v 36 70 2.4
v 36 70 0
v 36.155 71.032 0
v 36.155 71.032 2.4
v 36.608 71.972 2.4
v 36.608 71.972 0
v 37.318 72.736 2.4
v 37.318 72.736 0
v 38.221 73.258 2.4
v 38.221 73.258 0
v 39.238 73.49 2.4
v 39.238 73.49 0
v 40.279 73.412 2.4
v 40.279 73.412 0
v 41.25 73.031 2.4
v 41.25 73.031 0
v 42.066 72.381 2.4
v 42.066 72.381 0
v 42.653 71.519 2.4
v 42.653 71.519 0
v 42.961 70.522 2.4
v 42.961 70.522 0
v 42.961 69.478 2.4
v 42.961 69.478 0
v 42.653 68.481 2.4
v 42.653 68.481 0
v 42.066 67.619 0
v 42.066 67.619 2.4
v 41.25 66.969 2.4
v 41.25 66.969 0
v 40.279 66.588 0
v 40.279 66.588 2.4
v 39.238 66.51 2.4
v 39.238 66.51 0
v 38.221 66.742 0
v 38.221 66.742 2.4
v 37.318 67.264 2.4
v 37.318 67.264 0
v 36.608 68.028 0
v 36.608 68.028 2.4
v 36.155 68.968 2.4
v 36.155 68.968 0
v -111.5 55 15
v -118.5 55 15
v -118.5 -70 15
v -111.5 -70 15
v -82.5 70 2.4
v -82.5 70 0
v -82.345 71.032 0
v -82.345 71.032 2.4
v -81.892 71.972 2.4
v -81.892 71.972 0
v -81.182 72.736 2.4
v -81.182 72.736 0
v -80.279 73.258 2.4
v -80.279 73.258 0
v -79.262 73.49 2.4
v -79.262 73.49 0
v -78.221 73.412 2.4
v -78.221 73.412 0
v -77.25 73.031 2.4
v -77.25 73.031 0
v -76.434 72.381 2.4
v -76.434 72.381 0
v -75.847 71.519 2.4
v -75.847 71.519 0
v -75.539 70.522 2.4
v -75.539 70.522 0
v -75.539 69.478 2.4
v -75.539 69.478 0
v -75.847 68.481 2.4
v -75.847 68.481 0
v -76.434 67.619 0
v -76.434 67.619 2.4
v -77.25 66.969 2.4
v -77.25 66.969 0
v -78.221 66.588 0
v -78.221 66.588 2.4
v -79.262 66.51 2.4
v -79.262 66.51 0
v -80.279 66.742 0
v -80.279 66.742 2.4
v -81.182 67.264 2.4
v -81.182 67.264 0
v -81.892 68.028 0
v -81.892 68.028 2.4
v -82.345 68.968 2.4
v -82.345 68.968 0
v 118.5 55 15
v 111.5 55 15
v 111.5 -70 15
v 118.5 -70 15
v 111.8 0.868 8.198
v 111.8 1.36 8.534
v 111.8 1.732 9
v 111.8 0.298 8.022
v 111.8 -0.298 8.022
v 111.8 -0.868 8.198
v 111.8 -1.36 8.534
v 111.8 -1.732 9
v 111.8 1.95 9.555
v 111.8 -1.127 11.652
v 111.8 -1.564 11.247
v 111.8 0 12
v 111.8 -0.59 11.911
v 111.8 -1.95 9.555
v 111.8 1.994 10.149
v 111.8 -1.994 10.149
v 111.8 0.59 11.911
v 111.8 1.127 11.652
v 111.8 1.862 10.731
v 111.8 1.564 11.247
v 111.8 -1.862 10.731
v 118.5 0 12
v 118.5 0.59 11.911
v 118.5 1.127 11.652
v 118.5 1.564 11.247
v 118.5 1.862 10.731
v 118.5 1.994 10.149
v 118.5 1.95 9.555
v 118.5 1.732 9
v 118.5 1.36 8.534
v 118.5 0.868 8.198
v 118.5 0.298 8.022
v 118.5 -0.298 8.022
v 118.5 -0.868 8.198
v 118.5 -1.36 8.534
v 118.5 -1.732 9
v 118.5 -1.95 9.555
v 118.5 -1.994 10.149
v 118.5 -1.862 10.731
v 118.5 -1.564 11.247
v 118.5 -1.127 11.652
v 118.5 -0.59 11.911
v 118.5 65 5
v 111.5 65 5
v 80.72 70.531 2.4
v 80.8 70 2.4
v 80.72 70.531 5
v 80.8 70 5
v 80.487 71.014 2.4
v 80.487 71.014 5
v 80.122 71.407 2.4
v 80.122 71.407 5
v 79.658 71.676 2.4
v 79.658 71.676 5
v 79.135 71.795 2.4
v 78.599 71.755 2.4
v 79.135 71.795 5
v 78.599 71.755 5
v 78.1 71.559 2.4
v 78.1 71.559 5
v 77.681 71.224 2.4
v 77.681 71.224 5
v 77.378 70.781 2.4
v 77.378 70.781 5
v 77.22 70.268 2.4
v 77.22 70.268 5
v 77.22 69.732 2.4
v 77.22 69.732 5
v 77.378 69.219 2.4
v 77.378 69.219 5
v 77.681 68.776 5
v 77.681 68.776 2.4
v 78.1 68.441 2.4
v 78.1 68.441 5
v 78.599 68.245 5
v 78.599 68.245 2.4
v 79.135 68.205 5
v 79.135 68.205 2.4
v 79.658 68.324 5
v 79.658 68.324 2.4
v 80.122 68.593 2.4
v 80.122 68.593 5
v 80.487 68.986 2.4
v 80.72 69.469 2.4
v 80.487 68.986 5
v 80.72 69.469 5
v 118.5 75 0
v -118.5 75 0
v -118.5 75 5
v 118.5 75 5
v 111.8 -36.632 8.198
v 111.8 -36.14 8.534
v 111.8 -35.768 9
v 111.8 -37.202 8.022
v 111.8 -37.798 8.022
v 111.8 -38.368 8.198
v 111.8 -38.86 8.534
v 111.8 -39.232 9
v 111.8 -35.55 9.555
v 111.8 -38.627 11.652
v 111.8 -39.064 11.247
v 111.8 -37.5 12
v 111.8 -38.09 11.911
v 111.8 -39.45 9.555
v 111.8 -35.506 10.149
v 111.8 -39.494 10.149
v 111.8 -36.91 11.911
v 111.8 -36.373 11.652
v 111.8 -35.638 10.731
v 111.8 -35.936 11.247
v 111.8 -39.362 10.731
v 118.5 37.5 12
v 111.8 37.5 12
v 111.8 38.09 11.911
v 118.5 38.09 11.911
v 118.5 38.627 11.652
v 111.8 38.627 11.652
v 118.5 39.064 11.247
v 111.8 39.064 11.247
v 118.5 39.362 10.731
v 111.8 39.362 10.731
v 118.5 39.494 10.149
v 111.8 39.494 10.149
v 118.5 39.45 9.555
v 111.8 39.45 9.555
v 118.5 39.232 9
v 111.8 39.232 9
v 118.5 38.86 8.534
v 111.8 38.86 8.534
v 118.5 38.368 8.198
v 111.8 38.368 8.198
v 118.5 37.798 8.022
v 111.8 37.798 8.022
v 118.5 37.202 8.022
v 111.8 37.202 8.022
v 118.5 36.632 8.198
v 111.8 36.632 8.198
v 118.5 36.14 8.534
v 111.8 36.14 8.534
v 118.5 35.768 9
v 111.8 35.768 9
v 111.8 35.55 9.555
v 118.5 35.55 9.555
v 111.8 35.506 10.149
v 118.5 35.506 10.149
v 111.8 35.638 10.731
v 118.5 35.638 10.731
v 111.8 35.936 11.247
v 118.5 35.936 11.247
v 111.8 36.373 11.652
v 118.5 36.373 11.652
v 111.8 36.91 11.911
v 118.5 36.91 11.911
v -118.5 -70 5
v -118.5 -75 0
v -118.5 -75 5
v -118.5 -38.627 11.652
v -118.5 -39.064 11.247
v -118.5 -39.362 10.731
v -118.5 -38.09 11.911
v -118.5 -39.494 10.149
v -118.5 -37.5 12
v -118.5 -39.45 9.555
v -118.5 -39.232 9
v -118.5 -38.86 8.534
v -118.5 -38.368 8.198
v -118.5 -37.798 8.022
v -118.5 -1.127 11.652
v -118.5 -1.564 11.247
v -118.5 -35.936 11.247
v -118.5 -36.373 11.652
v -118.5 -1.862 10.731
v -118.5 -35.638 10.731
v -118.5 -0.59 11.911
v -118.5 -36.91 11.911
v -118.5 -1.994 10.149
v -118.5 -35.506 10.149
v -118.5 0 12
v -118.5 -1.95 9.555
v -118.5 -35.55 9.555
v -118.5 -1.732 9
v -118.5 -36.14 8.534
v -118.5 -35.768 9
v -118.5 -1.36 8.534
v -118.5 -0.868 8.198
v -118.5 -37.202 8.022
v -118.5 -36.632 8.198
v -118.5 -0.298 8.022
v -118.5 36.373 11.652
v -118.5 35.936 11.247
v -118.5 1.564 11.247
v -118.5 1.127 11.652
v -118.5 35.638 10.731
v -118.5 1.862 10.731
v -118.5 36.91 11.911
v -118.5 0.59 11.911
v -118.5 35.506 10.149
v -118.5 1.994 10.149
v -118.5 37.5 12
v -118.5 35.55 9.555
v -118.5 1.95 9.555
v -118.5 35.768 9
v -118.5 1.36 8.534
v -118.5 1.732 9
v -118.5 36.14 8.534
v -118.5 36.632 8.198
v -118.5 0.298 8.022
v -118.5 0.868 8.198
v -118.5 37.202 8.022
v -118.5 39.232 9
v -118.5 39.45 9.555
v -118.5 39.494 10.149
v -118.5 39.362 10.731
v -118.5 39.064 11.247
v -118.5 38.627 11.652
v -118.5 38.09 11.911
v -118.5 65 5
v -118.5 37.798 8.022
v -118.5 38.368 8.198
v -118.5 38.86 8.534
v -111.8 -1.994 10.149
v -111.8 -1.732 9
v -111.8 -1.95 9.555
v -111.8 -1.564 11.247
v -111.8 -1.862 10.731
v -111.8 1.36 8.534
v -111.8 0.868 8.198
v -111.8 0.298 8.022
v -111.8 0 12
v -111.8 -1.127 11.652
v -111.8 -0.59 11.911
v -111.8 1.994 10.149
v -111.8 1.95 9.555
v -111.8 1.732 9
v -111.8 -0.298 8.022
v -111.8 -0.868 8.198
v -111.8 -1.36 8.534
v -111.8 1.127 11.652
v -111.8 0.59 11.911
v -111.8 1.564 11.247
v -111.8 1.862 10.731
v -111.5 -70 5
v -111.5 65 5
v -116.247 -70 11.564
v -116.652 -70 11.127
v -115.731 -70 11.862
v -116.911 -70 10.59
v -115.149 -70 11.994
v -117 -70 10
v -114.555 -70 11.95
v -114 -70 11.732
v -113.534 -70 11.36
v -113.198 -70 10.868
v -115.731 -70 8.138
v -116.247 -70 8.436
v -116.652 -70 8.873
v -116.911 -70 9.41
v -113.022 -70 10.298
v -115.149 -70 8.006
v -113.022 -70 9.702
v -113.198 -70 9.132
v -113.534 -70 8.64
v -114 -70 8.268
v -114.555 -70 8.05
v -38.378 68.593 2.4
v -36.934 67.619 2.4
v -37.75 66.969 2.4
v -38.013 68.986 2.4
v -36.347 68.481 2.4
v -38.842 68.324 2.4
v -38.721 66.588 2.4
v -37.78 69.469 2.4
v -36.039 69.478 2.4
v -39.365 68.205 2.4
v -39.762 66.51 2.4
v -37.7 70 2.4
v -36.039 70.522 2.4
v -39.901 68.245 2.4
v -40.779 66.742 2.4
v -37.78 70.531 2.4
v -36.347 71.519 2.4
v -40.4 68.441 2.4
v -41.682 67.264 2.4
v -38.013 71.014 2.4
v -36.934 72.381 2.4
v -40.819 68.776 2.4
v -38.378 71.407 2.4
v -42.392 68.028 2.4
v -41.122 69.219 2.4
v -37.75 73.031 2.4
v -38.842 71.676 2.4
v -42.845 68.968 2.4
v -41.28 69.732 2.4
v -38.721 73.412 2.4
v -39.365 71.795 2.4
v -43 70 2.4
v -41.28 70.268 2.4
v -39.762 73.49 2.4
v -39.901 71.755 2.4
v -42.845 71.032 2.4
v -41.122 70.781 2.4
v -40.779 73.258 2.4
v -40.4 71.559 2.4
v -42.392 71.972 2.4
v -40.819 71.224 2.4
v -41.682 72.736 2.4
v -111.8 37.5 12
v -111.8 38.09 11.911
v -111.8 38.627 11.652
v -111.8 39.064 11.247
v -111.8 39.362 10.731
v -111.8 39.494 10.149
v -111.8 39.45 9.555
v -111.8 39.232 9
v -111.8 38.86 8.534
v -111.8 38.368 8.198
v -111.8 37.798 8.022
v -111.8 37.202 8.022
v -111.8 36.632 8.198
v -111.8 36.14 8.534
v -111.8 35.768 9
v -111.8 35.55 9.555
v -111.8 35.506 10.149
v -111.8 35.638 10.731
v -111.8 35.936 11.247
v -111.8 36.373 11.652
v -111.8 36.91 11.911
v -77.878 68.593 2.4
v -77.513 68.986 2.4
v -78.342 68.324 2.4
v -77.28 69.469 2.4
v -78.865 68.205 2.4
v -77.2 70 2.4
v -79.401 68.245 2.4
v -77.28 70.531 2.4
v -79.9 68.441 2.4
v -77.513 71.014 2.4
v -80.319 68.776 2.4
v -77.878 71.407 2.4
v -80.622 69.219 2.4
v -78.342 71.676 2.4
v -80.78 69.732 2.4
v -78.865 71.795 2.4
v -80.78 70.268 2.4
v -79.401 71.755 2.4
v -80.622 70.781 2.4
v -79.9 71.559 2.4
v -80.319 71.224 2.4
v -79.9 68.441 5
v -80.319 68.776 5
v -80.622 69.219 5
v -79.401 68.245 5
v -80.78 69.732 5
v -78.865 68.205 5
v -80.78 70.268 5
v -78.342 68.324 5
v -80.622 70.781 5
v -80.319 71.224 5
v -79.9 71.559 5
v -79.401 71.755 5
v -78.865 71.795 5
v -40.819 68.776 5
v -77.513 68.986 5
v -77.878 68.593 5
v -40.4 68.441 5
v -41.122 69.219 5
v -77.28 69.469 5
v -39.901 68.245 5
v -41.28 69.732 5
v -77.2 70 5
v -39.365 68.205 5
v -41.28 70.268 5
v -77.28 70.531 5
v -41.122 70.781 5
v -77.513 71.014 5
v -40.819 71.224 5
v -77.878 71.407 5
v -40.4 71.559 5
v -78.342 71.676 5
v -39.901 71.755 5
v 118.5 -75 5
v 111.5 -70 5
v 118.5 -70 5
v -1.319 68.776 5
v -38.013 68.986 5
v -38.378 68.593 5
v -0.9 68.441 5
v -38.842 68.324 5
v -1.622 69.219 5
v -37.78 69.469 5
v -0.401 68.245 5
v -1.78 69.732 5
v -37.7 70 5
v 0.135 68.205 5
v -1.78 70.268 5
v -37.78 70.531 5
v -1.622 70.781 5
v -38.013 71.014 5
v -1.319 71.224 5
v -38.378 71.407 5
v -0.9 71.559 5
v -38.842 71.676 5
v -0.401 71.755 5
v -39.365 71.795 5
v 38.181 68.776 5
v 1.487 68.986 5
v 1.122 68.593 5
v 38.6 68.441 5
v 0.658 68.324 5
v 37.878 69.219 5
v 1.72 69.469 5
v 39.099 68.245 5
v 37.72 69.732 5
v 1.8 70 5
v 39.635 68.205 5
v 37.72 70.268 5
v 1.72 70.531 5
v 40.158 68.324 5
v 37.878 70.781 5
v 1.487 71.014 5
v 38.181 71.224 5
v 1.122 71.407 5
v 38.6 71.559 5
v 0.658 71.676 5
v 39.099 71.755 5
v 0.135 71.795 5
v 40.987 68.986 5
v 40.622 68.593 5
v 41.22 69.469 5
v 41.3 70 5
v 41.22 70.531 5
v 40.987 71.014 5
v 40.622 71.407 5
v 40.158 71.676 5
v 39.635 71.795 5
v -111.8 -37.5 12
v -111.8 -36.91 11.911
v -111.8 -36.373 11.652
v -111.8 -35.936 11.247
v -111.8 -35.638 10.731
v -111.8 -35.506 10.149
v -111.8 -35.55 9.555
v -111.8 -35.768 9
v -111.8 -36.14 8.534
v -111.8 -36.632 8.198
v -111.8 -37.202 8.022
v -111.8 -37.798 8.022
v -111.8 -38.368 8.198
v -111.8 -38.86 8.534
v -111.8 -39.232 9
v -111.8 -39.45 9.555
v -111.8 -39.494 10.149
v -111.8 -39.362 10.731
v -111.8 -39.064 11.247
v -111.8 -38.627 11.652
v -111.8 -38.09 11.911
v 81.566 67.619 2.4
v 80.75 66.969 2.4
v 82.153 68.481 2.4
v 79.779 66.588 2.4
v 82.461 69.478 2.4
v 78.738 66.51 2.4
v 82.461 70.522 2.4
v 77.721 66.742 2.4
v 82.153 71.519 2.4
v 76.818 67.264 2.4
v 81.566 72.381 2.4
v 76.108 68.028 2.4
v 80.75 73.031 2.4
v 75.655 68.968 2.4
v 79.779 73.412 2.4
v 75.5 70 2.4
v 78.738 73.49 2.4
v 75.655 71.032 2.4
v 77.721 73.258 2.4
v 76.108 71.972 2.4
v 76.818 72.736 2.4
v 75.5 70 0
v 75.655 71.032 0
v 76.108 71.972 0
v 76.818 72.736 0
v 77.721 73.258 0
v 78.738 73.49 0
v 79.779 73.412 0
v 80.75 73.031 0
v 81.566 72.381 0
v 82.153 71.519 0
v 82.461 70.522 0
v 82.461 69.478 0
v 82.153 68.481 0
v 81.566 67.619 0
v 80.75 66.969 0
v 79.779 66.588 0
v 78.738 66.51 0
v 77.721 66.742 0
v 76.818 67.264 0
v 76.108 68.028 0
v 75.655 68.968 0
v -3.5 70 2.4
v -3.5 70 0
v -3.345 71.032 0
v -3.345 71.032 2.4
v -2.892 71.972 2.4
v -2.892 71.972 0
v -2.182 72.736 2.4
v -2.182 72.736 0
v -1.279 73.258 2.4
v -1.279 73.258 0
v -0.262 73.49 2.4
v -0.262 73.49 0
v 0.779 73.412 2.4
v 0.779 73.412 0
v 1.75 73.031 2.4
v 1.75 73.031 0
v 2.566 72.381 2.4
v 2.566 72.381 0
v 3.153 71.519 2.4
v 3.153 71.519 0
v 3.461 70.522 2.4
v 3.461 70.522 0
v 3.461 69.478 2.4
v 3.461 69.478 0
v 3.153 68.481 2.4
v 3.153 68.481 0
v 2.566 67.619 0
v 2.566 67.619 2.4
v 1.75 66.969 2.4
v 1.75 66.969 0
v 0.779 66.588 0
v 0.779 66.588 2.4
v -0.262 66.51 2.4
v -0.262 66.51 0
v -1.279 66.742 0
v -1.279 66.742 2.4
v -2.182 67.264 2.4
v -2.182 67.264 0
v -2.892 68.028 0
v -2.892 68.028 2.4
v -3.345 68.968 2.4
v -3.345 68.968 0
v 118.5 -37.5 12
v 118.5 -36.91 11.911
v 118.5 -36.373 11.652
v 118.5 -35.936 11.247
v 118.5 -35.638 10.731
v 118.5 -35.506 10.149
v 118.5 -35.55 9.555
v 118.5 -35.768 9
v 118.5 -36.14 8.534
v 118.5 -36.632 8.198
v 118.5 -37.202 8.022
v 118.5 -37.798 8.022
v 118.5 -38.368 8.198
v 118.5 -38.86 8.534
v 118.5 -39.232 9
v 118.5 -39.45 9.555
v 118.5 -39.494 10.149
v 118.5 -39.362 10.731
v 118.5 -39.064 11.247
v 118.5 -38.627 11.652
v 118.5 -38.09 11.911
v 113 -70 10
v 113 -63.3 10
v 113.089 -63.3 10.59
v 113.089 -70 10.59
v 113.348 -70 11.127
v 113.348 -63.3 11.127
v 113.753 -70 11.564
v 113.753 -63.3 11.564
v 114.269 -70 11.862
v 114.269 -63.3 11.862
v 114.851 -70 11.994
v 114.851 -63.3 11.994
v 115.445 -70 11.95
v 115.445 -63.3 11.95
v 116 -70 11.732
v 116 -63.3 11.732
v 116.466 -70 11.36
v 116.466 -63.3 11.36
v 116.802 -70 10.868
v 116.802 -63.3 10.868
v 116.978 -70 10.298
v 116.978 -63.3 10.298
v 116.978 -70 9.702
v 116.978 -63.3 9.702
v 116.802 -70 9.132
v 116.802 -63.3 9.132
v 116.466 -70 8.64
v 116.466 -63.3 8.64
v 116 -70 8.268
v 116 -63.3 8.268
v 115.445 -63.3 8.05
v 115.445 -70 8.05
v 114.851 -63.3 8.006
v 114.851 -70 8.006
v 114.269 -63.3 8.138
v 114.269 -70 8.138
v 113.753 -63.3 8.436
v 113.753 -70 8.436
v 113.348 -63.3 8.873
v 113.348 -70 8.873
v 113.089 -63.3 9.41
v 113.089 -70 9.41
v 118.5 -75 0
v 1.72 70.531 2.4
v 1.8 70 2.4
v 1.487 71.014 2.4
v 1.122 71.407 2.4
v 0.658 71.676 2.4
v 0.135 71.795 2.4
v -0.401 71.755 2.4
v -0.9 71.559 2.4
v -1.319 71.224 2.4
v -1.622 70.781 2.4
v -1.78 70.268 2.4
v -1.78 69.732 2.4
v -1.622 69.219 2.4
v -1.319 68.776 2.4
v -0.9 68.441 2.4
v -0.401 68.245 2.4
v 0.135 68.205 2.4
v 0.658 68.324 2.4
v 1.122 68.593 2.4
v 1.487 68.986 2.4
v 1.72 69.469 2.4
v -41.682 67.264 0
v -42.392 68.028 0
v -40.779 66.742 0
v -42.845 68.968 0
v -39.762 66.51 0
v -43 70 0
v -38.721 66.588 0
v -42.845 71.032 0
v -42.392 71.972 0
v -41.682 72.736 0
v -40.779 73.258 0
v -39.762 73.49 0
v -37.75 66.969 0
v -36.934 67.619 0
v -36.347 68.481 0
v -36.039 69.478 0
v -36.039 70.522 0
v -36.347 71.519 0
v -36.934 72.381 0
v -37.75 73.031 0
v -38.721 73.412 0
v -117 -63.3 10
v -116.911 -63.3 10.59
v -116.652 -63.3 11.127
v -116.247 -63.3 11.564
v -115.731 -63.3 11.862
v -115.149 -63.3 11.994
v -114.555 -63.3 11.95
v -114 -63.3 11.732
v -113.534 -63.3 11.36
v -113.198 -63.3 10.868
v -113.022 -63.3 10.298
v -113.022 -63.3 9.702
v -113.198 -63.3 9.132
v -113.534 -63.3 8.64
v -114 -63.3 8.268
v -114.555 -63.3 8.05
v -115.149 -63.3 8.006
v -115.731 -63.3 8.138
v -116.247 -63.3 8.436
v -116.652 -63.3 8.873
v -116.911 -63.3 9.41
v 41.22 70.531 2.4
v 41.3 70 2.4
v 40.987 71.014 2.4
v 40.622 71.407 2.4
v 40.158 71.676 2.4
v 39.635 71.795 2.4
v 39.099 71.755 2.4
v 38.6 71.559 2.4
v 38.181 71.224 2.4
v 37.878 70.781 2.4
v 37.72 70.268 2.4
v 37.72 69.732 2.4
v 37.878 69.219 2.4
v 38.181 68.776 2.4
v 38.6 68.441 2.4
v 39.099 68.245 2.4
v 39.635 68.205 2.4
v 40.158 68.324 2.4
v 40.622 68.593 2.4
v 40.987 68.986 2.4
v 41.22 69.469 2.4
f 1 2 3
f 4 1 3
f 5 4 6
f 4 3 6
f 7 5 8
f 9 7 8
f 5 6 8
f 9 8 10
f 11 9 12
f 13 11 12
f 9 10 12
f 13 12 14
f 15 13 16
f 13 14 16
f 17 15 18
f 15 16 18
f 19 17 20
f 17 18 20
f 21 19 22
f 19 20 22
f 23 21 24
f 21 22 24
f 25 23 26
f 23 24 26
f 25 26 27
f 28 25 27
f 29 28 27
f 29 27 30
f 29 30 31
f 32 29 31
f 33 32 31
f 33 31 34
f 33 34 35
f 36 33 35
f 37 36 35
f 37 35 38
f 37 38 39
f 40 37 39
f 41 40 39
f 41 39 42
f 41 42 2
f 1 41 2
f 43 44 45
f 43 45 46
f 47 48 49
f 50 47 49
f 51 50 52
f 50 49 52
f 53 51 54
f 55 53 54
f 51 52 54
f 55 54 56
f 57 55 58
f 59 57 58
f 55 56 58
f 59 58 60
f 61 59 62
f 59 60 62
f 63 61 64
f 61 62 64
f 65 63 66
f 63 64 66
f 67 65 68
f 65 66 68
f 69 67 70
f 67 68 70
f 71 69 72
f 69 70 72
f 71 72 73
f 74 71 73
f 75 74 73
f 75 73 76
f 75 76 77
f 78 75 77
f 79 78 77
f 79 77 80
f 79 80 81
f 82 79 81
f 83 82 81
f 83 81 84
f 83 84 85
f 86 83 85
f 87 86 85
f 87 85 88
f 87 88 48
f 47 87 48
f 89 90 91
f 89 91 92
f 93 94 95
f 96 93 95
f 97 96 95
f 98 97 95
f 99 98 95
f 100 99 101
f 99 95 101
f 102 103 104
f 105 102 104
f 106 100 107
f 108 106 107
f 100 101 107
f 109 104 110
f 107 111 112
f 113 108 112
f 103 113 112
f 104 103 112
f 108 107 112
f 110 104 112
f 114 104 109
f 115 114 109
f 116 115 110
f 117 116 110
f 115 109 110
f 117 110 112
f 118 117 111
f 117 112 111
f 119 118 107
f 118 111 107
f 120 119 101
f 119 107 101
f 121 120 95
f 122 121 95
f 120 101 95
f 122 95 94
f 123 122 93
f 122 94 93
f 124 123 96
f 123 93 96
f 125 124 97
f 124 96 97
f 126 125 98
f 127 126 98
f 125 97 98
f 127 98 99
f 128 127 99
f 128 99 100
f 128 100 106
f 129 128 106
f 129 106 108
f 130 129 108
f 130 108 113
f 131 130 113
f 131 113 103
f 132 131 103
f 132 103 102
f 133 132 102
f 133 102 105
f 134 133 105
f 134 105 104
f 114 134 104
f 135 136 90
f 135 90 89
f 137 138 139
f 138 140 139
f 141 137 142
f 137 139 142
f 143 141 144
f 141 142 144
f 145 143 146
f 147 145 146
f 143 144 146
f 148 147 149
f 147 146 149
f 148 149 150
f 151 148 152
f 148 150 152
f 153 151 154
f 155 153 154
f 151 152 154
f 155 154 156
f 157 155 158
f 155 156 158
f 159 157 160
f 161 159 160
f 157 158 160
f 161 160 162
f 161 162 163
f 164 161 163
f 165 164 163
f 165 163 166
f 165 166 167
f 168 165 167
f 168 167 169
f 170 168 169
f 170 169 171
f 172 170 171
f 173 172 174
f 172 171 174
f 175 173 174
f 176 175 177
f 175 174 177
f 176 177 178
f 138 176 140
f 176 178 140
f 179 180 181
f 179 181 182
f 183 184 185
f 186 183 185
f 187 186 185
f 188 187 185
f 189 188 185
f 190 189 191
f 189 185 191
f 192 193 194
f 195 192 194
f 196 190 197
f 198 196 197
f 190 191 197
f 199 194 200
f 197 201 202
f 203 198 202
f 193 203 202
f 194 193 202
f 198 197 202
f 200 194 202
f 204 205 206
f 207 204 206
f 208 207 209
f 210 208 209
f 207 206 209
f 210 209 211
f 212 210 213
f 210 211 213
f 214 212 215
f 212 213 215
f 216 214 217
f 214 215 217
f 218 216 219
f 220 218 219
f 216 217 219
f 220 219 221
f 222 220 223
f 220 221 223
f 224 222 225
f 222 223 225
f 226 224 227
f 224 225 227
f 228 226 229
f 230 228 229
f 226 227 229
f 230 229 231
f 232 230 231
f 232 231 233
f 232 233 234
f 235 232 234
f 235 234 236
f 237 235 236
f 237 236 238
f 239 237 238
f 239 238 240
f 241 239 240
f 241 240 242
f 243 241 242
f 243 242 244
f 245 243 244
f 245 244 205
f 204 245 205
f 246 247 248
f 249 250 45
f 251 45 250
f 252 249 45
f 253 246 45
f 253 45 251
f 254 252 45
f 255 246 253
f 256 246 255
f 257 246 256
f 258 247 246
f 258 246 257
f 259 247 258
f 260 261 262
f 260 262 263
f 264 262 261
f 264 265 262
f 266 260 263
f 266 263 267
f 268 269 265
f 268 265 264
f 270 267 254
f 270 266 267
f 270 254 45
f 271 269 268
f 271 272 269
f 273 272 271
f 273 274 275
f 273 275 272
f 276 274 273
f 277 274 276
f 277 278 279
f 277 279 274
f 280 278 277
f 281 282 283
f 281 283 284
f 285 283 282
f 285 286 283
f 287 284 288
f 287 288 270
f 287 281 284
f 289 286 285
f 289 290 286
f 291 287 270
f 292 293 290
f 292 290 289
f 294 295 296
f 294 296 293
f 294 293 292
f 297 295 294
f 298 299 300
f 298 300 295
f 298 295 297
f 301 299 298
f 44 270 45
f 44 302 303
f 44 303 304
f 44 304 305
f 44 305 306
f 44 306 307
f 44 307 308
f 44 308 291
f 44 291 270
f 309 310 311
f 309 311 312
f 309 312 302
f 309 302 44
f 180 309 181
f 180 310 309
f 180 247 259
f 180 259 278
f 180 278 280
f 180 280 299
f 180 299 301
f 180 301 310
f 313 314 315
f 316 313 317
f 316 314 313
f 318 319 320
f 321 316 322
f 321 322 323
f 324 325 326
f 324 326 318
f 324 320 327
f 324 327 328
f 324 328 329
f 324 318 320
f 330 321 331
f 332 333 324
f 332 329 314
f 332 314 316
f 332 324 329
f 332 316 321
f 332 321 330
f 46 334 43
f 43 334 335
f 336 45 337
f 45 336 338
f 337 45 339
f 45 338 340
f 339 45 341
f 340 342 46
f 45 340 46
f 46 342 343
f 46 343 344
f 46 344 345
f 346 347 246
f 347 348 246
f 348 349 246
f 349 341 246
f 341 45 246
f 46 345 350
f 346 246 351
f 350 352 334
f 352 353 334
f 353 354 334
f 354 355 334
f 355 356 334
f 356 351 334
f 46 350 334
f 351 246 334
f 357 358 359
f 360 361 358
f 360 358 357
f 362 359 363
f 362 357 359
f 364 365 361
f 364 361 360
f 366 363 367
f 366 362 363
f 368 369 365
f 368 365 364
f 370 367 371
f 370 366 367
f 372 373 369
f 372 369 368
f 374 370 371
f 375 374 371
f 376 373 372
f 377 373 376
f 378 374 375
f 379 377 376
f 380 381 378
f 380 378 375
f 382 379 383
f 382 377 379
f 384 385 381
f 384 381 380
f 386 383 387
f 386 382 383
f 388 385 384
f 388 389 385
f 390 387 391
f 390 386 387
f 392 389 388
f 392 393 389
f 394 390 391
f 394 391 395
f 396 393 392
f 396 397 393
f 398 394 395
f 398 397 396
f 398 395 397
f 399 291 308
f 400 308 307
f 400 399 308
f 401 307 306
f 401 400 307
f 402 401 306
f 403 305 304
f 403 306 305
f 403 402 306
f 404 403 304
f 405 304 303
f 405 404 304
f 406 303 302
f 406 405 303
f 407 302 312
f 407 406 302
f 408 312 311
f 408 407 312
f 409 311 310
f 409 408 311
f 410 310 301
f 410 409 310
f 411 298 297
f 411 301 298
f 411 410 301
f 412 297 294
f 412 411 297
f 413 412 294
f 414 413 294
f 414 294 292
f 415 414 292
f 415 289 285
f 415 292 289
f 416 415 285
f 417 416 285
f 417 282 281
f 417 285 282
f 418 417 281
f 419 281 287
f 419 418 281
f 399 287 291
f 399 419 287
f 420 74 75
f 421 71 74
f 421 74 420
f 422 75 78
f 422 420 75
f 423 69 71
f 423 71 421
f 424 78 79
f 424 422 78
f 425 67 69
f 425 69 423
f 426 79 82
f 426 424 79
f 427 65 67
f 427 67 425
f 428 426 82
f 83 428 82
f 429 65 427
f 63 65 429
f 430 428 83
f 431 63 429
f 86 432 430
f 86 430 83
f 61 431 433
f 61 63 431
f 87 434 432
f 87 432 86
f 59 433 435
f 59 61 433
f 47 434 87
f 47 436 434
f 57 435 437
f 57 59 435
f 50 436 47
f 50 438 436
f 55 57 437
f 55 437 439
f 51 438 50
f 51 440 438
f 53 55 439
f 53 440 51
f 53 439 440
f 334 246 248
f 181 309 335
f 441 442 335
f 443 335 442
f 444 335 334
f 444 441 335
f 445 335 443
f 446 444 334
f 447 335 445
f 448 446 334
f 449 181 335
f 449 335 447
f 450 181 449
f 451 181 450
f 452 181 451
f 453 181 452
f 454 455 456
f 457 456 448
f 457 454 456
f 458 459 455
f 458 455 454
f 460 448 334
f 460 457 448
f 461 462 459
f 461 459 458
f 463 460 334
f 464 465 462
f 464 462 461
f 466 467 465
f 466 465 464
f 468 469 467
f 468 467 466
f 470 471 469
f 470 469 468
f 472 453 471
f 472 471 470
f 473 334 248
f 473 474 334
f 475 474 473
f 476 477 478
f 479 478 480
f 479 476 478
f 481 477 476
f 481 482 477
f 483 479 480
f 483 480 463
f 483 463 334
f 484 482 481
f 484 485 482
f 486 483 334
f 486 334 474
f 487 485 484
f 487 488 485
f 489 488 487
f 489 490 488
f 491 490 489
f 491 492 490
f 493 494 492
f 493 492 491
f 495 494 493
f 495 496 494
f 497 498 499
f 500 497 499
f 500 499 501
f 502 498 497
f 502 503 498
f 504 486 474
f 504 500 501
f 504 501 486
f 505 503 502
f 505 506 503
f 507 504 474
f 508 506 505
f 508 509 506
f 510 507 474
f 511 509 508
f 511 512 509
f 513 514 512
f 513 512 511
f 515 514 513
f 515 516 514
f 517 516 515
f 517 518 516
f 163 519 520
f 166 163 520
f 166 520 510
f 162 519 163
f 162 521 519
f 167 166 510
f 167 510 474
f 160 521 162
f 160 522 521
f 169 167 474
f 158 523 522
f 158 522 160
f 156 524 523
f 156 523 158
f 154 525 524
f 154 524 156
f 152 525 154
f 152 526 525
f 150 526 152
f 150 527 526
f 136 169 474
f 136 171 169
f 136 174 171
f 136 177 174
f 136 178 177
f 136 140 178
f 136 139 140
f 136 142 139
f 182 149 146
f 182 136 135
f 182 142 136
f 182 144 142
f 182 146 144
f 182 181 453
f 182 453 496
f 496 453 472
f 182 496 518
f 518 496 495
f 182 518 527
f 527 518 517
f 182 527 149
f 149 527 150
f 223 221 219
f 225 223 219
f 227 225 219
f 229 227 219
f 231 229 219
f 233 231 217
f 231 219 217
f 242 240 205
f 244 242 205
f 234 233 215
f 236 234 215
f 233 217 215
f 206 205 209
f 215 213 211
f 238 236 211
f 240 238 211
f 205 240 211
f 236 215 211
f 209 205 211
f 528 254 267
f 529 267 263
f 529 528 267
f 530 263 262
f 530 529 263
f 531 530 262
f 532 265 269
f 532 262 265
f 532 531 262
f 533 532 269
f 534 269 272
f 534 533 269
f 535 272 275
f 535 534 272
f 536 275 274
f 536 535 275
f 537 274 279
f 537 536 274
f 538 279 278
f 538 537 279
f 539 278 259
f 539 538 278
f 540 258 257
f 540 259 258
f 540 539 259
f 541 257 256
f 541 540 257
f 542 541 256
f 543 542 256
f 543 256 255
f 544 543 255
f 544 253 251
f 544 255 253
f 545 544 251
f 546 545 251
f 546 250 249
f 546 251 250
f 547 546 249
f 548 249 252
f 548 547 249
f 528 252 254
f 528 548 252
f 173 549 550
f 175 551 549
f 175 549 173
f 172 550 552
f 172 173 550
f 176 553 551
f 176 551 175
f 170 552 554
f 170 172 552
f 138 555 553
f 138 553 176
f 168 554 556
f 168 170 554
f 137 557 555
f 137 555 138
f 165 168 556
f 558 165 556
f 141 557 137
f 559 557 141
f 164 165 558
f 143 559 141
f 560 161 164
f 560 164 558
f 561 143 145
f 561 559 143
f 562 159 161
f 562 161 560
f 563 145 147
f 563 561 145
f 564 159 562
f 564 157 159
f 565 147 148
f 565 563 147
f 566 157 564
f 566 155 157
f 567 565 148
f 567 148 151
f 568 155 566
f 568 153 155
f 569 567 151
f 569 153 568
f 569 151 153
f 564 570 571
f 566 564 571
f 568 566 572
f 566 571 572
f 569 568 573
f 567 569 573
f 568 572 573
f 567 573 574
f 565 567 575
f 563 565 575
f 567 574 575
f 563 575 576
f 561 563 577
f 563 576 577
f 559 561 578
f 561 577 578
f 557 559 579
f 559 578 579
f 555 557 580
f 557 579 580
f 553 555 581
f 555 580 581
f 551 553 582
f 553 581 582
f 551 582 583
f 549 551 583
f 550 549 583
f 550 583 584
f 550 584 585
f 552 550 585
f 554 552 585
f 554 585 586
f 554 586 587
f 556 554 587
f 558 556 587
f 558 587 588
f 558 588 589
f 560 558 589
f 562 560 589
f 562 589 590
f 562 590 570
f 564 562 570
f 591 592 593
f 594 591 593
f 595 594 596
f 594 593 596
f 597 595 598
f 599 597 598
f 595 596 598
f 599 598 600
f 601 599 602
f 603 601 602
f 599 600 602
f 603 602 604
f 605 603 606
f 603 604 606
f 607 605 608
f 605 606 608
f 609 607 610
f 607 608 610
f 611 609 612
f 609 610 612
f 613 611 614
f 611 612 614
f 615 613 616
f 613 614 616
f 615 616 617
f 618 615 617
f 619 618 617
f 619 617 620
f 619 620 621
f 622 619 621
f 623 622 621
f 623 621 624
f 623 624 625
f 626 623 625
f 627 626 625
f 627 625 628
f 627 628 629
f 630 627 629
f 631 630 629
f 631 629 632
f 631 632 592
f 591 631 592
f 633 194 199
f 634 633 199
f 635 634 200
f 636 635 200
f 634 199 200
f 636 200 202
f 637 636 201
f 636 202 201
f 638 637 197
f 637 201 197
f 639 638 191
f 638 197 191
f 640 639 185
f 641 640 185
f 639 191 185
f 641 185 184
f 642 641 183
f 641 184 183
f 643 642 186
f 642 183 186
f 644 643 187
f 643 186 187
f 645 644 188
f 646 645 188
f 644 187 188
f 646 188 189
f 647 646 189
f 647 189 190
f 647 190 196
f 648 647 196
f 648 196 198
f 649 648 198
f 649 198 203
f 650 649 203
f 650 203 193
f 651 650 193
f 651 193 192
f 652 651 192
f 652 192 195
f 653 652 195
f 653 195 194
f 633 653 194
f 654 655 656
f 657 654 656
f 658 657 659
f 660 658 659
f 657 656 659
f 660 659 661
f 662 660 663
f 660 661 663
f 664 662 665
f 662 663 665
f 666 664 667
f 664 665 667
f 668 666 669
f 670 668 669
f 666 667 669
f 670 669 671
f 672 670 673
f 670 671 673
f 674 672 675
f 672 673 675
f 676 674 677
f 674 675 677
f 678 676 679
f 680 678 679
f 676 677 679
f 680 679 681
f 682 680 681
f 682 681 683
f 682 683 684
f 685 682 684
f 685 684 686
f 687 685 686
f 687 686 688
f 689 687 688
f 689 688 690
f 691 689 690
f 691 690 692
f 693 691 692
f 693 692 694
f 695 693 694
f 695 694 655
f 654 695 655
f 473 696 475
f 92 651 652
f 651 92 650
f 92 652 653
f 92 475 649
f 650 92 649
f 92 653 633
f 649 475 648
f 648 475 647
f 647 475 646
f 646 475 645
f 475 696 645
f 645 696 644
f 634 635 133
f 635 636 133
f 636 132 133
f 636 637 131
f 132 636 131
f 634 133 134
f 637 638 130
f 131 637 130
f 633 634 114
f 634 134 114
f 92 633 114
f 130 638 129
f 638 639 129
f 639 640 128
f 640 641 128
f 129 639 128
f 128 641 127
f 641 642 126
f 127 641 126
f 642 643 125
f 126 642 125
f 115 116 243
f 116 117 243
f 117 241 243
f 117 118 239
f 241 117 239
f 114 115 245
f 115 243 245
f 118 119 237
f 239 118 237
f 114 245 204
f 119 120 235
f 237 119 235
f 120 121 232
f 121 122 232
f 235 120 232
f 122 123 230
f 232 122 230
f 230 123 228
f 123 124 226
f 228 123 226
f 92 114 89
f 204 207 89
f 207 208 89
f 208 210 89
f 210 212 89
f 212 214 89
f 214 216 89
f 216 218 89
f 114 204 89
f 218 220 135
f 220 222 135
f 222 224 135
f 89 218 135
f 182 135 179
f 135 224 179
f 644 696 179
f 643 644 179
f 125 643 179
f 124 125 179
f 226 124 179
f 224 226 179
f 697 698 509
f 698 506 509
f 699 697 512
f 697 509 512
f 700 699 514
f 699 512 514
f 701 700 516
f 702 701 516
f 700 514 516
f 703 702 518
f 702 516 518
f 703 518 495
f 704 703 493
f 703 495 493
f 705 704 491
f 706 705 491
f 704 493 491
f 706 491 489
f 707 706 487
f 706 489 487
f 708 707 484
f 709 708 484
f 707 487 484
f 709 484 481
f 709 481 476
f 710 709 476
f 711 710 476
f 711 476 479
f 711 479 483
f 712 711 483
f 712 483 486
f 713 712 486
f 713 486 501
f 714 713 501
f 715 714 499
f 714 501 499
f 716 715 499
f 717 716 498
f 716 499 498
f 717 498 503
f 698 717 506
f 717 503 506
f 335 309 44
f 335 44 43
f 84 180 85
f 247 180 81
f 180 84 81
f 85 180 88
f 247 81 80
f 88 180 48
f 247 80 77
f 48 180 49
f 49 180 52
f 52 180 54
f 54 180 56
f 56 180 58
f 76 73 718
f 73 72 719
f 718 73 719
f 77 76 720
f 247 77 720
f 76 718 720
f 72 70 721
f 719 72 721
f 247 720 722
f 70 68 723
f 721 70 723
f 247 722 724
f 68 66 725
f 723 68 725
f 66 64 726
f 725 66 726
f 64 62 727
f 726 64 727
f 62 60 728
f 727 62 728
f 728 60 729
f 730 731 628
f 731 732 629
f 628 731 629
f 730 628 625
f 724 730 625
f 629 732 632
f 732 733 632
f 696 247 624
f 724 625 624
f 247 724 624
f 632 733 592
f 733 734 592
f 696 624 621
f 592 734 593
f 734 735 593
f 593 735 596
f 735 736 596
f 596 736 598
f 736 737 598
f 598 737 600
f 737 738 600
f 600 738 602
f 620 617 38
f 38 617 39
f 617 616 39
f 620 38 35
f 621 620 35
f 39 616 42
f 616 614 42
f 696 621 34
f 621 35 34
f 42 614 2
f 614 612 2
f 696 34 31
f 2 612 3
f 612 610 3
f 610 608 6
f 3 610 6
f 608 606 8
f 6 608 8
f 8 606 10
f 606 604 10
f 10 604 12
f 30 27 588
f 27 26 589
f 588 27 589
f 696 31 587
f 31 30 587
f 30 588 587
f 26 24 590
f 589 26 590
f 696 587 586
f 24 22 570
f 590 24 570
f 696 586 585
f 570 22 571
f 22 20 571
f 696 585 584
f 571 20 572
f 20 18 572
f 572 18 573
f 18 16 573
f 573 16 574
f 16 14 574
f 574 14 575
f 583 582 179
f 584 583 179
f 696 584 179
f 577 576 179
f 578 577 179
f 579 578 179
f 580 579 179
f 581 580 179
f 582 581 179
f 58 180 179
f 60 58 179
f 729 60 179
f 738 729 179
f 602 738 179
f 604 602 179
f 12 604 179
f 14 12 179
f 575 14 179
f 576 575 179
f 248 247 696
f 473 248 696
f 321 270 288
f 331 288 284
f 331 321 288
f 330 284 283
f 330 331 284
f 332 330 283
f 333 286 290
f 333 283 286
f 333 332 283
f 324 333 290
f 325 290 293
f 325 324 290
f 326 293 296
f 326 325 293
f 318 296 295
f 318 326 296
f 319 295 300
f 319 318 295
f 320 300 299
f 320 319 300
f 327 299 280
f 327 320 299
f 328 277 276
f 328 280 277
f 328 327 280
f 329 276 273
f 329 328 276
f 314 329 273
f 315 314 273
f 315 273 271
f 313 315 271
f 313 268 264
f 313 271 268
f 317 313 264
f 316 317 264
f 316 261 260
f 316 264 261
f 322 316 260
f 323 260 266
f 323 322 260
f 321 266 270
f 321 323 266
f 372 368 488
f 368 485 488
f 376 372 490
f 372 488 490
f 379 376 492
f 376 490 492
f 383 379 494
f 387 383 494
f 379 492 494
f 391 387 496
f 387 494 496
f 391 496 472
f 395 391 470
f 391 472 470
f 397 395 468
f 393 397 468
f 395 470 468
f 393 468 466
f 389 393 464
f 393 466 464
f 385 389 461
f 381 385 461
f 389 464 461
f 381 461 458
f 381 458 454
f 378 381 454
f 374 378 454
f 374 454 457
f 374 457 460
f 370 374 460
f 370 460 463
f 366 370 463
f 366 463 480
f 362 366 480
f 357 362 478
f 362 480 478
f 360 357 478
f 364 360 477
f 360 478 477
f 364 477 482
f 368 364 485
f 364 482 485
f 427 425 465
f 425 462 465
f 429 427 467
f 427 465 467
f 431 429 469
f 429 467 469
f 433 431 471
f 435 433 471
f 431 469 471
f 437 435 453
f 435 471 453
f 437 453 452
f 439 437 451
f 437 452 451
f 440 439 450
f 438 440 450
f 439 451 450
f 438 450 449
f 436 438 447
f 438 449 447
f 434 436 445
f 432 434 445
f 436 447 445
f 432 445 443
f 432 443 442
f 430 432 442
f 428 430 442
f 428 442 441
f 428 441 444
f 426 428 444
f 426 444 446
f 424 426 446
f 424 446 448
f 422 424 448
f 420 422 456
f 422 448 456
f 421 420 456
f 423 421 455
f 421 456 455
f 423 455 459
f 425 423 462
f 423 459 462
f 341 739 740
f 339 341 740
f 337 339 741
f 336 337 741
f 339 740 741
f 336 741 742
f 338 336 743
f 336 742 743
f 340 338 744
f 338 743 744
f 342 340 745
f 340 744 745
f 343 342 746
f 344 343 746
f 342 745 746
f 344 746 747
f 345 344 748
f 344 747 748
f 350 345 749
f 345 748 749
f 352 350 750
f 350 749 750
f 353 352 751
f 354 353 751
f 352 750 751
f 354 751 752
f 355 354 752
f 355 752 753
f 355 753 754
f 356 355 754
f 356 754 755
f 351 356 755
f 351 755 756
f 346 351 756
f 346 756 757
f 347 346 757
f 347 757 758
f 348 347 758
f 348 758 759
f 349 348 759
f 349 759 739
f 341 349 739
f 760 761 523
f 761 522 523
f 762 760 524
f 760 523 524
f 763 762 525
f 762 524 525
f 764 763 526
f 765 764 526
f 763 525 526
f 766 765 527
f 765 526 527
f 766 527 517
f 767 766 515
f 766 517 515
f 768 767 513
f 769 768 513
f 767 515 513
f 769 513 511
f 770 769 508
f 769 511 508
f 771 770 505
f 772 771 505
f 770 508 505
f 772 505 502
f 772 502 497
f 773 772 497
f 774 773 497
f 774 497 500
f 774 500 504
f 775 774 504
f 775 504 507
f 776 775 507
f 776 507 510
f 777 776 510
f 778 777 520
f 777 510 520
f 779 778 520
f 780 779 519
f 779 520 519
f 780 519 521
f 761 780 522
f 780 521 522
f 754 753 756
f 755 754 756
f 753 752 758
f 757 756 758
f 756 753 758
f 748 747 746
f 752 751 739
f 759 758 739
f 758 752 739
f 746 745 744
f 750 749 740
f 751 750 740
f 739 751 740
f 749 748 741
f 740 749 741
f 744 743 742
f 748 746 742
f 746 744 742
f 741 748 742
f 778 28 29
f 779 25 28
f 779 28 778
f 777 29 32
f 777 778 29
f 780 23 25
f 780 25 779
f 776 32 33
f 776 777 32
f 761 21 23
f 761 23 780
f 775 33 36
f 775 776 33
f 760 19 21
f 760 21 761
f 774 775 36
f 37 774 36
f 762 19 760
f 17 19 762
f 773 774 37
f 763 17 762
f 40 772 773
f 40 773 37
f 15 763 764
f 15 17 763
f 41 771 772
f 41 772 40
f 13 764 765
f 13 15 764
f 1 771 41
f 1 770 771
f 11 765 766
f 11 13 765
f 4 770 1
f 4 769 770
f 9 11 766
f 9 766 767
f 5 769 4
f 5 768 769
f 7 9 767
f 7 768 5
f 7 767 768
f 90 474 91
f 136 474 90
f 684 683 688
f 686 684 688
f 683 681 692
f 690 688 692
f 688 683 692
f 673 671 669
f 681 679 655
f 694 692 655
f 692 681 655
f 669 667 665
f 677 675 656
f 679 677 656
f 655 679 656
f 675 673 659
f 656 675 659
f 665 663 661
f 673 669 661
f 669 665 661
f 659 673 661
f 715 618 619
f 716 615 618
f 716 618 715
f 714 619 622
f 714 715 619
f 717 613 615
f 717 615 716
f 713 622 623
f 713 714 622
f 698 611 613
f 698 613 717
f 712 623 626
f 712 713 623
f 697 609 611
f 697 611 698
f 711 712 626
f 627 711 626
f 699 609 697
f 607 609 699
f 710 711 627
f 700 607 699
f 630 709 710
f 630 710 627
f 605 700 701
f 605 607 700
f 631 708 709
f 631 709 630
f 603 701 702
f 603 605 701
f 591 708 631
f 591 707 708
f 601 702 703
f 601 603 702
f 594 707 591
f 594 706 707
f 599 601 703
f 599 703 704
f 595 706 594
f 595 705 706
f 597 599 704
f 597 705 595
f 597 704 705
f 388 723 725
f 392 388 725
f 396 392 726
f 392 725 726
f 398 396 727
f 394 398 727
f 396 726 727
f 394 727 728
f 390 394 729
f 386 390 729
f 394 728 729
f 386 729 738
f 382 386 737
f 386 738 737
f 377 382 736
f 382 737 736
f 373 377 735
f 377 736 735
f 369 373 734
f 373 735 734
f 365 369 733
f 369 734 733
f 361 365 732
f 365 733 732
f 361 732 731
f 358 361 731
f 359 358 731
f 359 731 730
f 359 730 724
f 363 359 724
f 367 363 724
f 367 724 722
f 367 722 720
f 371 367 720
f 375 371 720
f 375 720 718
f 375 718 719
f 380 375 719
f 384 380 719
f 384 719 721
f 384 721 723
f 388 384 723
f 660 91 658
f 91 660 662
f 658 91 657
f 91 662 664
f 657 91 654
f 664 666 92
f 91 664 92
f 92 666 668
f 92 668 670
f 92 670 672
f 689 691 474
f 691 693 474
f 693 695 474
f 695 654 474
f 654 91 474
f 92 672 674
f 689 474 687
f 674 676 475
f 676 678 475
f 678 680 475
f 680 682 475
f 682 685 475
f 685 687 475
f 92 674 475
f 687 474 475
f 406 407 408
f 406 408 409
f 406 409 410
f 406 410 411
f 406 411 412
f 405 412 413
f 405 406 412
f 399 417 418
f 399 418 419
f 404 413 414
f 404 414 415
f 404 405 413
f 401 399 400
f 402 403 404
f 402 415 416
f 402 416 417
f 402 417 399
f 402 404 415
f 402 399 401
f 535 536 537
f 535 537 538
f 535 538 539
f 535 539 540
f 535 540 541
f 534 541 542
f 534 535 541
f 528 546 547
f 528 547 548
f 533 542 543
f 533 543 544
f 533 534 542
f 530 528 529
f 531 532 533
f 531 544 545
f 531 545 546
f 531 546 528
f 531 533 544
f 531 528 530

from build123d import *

# Parameters (mm, degrees)
SZKIC1_W                                          = 237
SZKIC1_H                                          = 150
DODANIE_WYCI_GNI_CIE1_DEPTH                       = 5
SZKIC2_W                                          = 7
SZKIC2_H                                          = 135
DODANIE_WYCI_GNI_CIE2_DEPTH                       = 10
OTW_R_4_0_4_1_D                                   = 4
OTW_R_4_0_4_1_DEPTH                               = 6.7
SFAZOWANIE1_SIZE                                  = 10
POG_BIENIE_WALCOWE_POD_M3_RUB_Z_BEM_S_D           = 3.6
POG_BIENIE_WALCOWE_POD_M3_RUB_Z_BEM_S_DEPTH       = 6.7
POG_BIENIE_WALCOWE_POD_M3_RUB_Z_BEM_S_CBORE_D     = 7
POG_BIENIE_WALCOWE_POD_M3_RUB_Z_BEM_S_CBORE_DEPTH = 2.4
POG_BIENIE_WALCOWE_POD_M3_RUB_Z_BEM_S_TIP         = 1.081549114
OTWORY_USTALAJ_CE_4_0MM1_D                        = 4
OTWORY_USTALAJ_CE_4_0MM1_DEPTH                    = 6.7


with BuildPart() as part:
    # Szkic1 → Dodanie-wyciągnięcie1 (new body)
    with BuildSketch(Plane.XY):
        Rectangle(SZKIC1_W, SZKIC1_H)
    extrude(amount=DODANIE_WYCI_GNI_CIE1_DEPTH)

    # Szkic2 → Dodanie-wyciągnięcie2 (add)
    with BuildSketch(Plane.XY.offset(5)):
        with Locations((115, -2.5)):
            Rectangle(SZKIC2_W, SZKIC2_H)
        with Locations((-115, -2.5)):
            Rectangle(SZKIC2_W, SZKIC2_H)
    extrude(amount=DODANIE_WYCI_GNI_CIE2_DEPTH)

    # Otwór Ø4.0 (4)1
    with Locations(Plane(origin=(118.5, 0, 0), x_dir=(0, 0, -1), z_dir=(1, 0, 0))):
        with Locations((-10, -37.5), (-10, 37.5), (-10, 0)):
            otw_r_4_0_4_1 = Hole(OTW_R_4_0_4_1_D / 2, depth=OTW_R_4_0_4_1_DEPTH)

    # Lustro1: Otwór Ø4.0 (4)1 across plane
    add(otw_r_4_0_4_1.mirror(Plane.ZY), mode=Mode.SUBTRACT)

    # Sfazowanie1
    sfazowanie1_edges = [part.edges().sort_by_distance(p)[0] for p in [
        (-115, 65, 15),
        (115, 65, 15),
    ]]
    chamfer(sfazowanie1_edges, length=SFAZOWANIE1_SIZE - 0.0001)  # a hair under: the kernel refuses the full size

    # Pogłębienie walcowe pod M3 Śrubę z łbem stożkowym ściętym1
    with Locations(Plane(origin=(0, 0, 0), x_dir=(-1, 0, 0), z_dir=(0, 0, -1))):
        with Locations((-79, 70), (-39.5, 70), (79, 70), (0, 70), (39.5, 70)):
            CounterBoreHole(POG_BIENIE_WALCOWE_POD_M3_RUB_Z_BEM_S_D / 2, POG_BIENIE_WALCOWE_POD_M3_RUB_Z_BEM_S_CBORE_D / 2, POG_BIENIE_WALCOWE_POD_M3_RUB_Z_BEM_S_CBORE_DEPTH, depth=POG_BIENIE_WALCOWE_POD_M3_RUB_Z_BEM_S_DEPTH)
            with Locations((0, 0, -(POG_BIENIE_WALCOWE_POD_M3_RUB_Z_BEM_S_DEPTH + POG_BIENIE_WALCOWE_POD_M3_RUB_Z_BEM_S_TIP / 2))):  # 118° drill point
                Cone(0, POG_BIENIE_WALCOWE_POD_M3_RUB_Z_BEM_S_D / 2, POG_BIENIE_WALCOWE_POD_M3_RUB_Z_BEM_S_TIP, mode=Mode.SUBTRACT)

    # Otwory ustalające Ø4.0mm1
    with Locations(Plane.XZ.offset(70)):
        with Locations((115, 10), (-115, 10)):
            Hole(OTWORY_USTALAJ_CE_4_0MM1_D / 2, depth=OTWORY_USTALAJ_CE_4_0MM1_DEPTH)


solid = part.part
